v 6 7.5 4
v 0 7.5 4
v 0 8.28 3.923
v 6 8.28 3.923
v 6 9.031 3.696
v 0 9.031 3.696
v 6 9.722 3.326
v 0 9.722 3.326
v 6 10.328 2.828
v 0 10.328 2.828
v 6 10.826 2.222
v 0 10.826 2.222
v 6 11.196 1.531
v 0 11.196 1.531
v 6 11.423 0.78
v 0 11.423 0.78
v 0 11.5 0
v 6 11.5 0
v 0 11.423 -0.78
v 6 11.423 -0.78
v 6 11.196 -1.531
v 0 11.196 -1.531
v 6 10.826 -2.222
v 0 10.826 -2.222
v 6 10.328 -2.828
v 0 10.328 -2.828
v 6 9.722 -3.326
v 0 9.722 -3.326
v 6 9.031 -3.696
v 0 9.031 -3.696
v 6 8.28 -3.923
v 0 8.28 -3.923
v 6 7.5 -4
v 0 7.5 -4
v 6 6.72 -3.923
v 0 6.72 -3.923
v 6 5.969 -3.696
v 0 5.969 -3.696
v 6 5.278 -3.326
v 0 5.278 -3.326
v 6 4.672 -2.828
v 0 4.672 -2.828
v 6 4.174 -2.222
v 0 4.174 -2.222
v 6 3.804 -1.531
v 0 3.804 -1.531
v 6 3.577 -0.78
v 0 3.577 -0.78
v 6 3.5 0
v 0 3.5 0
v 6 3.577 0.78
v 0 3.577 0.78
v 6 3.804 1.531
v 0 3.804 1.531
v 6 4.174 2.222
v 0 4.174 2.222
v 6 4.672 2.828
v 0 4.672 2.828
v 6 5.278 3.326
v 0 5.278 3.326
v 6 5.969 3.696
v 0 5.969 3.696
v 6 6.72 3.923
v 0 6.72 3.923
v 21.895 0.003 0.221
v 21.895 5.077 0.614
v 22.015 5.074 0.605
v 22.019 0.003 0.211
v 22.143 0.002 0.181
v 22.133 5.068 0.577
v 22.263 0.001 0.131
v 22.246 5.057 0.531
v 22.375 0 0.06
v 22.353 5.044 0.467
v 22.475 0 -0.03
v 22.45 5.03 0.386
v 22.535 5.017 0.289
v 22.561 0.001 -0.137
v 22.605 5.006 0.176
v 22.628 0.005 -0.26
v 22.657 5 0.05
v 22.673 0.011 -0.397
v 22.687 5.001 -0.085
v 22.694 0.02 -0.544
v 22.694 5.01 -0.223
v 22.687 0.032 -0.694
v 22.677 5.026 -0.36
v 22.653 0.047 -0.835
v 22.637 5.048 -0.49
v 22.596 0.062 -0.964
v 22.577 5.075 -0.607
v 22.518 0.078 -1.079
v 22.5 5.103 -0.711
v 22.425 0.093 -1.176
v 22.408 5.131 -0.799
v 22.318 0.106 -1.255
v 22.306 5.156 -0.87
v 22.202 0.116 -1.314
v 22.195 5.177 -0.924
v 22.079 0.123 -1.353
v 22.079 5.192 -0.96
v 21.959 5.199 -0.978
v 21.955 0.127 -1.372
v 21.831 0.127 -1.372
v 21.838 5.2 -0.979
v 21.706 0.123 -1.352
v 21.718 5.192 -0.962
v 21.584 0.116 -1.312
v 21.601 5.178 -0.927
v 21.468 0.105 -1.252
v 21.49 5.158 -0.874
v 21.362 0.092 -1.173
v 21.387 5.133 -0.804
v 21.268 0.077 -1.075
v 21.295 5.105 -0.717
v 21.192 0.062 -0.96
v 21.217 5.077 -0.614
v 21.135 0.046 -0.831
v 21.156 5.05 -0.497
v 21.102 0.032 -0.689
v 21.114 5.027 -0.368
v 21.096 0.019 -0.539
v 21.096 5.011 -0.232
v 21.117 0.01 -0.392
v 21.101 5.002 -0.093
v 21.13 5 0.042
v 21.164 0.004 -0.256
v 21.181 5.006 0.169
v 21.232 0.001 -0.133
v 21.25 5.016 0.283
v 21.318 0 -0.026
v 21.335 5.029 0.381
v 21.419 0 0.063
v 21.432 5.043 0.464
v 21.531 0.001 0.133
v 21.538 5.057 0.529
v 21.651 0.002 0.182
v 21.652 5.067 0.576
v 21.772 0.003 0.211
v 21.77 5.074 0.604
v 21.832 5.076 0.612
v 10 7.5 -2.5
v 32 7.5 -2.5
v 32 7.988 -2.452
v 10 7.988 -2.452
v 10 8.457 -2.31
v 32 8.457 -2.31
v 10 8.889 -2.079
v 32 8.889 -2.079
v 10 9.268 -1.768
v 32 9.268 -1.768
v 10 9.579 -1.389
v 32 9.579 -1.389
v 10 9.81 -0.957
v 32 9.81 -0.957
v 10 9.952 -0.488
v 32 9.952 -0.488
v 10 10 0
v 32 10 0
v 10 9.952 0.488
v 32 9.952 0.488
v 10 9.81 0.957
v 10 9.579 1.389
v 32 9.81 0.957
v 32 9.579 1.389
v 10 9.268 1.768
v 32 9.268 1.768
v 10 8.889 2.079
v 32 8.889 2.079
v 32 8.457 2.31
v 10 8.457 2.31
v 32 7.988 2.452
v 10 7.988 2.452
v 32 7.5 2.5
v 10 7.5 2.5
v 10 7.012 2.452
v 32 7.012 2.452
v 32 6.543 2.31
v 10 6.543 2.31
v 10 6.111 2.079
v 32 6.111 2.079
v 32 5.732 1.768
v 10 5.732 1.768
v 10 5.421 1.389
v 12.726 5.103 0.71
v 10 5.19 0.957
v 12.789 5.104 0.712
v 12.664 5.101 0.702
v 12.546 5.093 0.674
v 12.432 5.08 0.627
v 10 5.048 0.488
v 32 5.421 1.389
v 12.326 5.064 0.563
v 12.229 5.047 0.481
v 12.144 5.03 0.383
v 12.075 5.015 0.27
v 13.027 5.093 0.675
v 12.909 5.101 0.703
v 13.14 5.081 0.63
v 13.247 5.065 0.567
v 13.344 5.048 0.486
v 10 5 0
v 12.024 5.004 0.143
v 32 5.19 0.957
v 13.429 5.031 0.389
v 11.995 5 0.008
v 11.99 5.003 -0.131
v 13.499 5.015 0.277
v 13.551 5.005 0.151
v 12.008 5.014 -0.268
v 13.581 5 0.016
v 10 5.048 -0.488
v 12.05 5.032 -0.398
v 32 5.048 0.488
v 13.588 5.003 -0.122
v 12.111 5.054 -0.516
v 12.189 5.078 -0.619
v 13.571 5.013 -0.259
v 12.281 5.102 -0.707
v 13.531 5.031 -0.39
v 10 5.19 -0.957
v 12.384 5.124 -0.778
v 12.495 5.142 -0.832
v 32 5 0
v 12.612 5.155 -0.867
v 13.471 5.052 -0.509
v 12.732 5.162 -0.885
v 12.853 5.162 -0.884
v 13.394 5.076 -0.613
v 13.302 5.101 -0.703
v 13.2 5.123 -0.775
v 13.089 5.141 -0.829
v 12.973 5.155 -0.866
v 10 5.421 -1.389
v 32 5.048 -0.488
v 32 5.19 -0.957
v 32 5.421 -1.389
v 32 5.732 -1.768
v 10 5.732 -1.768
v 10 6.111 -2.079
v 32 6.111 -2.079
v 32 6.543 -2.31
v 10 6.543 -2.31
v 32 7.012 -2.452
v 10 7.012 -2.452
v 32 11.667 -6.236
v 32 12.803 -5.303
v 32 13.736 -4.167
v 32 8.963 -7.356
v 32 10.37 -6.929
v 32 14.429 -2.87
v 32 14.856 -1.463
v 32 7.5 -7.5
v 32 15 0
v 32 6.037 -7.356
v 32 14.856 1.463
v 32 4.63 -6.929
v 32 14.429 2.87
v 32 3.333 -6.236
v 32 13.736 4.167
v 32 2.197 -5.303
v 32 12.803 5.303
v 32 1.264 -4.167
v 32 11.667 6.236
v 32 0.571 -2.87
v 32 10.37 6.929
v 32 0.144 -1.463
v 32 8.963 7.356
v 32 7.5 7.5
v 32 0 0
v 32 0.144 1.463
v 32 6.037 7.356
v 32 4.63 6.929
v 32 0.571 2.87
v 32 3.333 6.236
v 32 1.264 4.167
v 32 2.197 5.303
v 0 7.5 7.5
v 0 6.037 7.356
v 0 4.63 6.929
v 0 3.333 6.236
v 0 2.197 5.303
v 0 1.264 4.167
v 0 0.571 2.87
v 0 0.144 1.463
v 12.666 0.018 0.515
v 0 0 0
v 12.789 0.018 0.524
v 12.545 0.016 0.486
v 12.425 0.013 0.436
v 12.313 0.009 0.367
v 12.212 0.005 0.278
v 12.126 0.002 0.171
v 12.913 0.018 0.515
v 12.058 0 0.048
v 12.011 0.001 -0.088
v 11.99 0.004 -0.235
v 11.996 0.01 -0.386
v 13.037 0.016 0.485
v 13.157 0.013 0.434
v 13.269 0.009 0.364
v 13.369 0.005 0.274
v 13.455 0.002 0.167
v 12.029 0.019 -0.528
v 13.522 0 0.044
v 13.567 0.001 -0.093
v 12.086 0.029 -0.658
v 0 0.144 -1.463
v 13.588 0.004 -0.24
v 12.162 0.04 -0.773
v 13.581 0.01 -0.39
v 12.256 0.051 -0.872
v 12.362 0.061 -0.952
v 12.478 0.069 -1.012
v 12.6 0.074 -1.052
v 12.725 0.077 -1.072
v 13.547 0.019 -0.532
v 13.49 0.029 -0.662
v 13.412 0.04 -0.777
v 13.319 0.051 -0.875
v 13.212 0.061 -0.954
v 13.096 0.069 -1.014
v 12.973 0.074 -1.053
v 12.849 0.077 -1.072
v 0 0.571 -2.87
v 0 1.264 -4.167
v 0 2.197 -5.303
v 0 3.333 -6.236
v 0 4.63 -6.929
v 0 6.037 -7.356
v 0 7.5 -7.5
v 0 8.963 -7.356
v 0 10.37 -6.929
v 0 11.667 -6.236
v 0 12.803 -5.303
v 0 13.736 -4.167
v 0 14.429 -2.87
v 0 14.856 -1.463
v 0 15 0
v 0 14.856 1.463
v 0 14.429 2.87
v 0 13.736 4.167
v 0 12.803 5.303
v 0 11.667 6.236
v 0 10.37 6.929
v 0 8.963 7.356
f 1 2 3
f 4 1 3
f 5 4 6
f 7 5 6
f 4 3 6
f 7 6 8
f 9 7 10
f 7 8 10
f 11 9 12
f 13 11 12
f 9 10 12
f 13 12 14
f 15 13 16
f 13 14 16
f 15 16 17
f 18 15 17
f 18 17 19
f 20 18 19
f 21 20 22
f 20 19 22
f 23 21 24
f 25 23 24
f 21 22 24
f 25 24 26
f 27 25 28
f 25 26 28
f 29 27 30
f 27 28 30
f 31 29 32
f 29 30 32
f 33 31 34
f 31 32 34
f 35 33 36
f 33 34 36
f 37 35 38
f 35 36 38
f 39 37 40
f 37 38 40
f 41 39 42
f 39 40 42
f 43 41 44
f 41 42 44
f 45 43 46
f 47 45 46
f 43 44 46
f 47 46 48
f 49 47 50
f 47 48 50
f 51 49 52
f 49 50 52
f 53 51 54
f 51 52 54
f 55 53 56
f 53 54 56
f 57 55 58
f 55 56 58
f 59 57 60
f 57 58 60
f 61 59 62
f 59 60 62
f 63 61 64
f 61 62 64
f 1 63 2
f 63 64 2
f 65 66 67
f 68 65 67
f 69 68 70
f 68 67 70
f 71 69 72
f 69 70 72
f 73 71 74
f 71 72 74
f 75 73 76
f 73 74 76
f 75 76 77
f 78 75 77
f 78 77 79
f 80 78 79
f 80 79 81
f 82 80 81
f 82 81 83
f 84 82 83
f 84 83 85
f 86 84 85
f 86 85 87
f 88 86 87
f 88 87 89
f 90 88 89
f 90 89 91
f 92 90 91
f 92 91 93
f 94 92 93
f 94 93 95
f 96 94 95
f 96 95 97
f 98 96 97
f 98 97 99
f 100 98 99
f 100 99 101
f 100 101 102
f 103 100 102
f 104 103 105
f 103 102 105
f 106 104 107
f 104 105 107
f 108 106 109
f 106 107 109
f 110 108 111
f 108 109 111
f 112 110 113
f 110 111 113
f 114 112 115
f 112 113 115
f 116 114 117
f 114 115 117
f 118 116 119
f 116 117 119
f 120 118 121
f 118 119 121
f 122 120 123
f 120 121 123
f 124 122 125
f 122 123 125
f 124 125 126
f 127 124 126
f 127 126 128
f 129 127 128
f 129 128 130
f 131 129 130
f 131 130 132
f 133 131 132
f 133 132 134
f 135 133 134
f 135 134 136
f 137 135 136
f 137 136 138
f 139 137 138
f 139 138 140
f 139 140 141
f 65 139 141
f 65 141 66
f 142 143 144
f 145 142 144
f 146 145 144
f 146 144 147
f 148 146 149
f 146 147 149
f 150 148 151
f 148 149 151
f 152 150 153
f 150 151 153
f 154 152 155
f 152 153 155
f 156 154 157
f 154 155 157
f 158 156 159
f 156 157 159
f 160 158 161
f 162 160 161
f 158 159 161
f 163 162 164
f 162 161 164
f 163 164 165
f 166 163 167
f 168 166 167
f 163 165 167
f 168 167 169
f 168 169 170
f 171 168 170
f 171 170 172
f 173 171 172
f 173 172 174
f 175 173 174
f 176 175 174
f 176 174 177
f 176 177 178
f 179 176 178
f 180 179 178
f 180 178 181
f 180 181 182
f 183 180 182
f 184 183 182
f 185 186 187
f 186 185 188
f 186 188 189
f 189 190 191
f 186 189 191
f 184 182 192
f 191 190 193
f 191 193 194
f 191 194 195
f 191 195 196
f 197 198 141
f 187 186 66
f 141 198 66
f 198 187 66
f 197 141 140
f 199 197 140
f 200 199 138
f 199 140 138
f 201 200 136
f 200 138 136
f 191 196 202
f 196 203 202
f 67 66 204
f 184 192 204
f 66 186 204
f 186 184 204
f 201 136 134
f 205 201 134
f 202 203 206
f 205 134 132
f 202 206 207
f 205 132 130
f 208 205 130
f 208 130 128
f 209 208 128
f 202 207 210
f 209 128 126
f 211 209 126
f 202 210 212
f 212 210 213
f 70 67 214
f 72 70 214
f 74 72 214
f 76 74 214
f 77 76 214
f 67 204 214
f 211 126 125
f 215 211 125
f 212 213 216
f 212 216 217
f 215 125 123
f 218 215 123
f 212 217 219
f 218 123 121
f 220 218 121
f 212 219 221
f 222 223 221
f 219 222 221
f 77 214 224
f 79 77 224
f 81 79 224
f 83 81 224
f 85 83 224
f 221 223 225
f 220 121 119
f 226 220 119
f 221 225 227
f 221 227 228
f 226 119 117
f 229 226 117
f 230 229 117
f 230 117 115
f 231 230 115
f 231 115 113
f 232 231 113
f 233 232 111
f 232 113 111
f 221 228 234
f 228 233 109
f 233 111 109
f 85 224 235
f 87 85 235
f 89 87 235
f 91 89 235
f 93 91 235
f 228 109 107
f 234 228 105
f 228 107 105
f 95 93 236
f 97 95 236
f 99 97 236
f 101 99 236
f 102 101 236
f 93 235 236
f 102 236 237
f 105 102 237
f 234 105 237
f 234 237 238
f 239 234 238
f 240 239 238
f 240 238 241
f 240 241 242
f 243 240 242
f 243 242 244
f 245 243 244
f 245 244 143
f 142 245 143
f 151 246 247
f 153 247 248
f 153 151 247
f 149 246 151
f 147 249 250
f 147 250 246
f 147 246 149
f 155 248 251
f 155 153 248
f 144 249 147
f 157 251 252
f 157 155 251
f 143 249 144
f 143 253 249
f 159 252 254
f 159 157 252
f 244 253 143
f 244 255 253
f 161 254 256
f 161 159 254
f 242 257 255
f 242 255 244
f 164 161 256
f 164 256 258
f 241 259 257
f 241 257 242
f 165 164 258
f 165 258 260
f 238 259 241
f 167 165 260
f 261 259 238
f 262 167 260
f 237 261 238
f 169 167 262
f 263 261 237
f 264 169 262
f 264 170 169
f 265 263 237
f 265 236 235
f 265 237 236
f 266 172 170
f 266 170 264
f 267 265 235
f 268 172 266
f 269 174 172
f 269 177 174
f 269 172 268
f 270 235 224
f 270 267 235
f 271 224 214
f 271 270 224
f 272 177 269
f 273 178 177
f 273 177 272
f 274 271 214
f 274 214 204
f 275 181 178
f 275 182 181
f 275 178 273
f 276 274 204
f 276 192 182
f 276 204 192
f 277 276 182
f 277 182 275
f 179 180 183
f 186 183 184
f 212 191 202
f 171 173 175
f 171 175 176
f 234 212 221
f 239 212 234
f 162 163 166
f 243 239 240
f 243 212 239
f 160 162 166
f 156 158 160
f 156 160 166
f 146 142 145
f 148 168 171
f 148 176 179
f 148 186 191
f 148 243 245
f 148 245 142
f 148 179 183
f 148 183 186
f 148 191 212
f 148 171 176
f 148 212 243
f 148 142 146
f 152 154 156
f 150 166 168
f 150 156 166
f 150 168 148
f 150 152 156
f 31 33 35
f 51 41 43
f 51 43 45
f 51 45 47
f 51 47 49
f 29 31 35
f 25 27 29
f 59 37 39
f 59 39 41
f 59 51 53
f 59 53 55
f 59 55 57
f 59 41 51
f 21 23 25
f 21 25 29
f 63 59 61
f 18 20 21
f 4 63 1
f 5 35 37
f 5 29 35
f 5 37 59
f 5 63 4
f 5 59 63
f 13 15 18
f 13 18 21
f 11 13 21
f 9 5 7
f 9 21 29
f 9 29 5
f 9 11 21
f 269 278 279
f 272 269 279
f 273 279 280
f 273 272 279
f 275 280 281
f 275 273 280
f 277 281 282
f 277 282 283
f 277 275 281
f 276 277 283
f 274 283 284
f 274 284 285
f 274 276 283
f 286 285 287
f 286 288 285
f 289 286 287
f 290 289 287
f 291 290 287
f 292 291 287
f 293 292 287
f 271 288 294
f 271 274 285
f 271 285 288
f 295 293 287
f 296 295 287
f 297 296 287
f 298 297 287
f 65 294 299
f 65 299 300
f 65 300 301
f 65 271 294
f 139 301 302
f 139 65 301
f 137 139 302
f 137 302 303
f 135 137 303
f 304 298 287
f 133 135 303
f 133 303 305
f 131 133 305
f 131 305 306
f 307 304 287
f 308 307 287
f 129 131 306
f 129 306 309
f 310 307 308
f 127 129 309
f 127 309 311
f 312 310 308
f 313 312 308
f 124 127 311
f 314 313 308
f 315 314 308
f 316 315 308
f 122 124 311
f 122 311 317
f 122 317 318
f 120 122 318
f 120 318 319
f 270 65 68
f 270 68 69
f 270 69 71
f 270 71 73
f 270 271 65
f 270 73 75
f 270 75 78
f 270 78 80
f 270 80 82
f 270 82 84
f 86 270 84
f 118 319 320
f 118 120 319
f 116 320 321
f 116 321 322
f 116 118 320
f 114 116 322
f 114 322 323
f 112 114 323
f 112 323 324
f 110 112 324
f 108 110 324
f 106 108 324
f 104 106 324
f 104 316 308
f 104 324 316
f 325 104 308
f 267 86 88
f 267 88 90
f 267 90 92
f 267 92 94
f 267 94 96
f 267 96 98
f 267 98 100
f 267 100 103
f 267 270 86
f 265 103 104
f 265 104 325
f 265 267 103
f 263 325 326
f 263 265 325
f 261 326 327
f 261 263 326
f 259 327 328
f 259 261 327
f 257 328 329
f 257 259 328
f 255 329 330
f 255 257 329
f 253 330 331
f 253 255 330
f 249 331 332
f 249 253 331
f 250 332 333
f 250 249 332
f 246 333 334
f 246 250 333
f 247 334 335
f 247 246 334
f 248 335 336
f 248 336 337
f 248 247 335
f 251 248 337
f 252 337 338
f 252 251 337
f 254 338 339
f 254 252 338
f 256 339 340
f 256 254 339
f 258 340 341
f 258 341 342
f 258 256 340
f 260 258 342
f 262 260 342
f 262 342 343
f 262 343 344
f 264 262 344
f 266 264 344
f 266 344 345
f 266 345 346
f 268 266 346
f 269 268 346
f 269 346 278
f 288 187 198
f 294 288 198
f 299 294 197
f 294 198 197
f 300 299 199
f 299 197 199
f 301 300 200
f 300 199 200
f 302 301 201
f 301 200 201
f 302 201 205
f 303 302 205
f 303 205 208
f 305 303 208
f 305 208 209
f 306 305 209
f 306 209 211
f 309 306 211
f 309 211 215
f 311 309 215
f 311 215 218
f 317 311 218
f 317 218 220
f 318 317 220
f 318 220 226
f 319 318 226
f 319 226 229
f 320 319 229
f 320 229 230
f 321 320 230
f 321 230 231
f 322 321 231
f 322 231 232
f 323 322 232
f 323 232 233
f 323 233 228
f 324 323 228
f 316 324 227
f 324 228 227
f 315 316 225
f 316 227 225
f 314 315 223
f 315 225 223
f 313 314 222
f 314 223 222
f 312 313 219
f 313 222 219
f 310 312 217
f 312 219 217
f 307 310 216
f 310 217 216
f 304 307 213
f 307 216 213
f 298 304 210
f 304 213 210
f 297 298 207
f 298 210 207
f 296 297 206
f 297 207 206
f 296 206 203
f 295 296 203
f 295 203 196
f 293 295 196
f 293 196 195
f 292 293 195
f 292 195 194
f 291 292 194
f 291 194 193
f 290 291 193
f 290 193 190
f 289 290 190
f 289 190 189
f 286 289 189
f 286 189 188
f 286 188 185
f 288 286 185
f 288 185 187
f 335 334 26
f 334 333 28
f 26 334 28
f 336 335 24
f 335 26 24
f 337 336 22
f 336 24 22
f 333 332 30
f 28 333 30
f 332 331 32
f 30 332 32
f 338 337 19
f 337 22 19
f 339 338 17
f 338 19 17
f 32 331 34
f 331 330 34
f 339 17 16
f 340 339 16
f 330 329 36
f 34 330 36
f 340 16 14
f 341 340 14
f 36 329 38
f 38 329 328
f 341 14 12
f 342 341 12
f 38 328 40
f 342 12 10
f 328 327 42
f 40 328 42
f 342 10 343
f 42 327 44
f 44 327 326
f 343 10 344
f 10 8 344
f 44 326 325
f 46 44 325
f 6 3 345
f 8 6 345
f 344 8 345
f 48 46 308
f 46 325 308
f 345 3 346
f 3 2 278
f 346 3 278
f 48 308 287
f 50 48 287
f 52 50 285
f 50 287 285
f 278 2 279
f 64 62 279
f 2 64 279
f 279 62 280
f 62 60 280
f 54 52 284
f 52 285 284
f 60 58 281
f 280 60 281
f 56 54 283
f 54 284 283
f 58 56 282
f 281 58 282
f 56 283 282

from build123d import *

# Parameters (mm, degrees)
ESQUISSE1_W                      = 32
ESQUISSE1_H                      = 7.5
ESQUISSE2_R                      = 2.5
ENL_V_MAT_EXTRU_1_DEPTH          = 22
ESQUISSE4_R                      = 4
ENL_V_MAT_EXTRU_2_DEPTH          = 6
D_GAGEMENT_M1_41_D               = 1.6
D_GAGEMENT_M1_41_DEPTH           = 6
D_GAGEMENT_M1_41_TIP             = 0.480688495
D_GAGEMENT_M1_41_ON_FACE_2_D     = 1.6
D_GAGEMENT_M1_41_ON_FACE_2_DEPTH = 6
D_GAGEMENT_M1_41_ON_FACE_2_TIP   = 0.480688495


with BuildPart() as part:
    # Esquisse1 → Révolution2 (revolve)
    with BuildSketch(Plane.XY, mode=Mode.PRIVATE) as r_volution2_sk:
        with Locations((16, 3.75)):
            Rectangle(ESQUISSE1_W, ESQUISSE1_H)
    revolve(r_volution2_sk.sketch.rotate(Axis((0, 7.5, 0), (1, 0, 0)), 270), axis=Axis((0, 7.5, 0), (1, 0, 0)))

    # Esquisse2 → Enlèv. mat.-Extru.1 (cut)
    with BuildSketch(Plane(origin=(32, 0, 0), x_dir=(0, 0, -1), z_dir=(1, 0, 0))):
        with Locations((0, 7.5)):
            Circle(ESQUISSE2_R)
    extrude(amount=-ENL_V_MAT_EXTRU_1_DEPTH, mode=Mode.SUBTRACT)

    # Esquisse4 → Enlèv. mat.-Extru.2 (cut)
    with BuildSketch(Plane.ZY):
        with Locations((0, 7.5)):
            Circle(ESQUISSE4_R)
    extrude(amount=-ENL_V_MAT_EXTRU_2_DEPTH, mode=Mode.SUBTRACT)

    # Dégagement M1.41
    with Locations(Plane(origin=(21.894837685, 0.022480062, -0.580254755), x_dir=(0, 0.077367300627, -0.997002658368), z_dir=(0, -0.997002658368, -0.077367300627))):
        with Locations((0, 0)):
            Hole(D_GAGEMENT_M1_41_D / 2, depth=D_GAGEMENT_M1_41_DEPTH)
            with Locations((0, 0, -(D_GAGEMENT_M1_41_DEPTH + D_GAGEMENT_M1_41_TIP / 2))):  # 118° drill point
                Cone(0, D_GAGEMENT_M1_41_D / 2, D_GAGEMENT_M1_41_TIP, mode=Mode.SUBTRACT)

    # Dégagement M1.41 on face 2
    with Locations(Plane(origin=(12.788839851, 0.005106148, -0.276705898), x_dir=(0, 0.036894006807, -0.999319184376), z_dir=(0, -0.999319184376, -0.036894006807))):
        with Locations((0, 0)):
            Hole(D_GAGEMENT_M1_41_ON_FACE_2_D / 2, depth=D_GAGEMENT_M1_41_ON_FACE_2_DEPTH)
            with Locations((0, 0, -(D_GAGEMENT_M1_41_ON_FACE_2_DEPTH + D_GAGEMENT_M1_41_ON_FACE_2_TIP / 2))):  # 118° drill point
                Cone(0, D_GAGEMENT_M1_41_ON_FACE_2_D / 2, D_GAGEMENT_M1_41_ON_FACE_2_TIP, mode=Mode.SUBTRACT)


solid = part.part
